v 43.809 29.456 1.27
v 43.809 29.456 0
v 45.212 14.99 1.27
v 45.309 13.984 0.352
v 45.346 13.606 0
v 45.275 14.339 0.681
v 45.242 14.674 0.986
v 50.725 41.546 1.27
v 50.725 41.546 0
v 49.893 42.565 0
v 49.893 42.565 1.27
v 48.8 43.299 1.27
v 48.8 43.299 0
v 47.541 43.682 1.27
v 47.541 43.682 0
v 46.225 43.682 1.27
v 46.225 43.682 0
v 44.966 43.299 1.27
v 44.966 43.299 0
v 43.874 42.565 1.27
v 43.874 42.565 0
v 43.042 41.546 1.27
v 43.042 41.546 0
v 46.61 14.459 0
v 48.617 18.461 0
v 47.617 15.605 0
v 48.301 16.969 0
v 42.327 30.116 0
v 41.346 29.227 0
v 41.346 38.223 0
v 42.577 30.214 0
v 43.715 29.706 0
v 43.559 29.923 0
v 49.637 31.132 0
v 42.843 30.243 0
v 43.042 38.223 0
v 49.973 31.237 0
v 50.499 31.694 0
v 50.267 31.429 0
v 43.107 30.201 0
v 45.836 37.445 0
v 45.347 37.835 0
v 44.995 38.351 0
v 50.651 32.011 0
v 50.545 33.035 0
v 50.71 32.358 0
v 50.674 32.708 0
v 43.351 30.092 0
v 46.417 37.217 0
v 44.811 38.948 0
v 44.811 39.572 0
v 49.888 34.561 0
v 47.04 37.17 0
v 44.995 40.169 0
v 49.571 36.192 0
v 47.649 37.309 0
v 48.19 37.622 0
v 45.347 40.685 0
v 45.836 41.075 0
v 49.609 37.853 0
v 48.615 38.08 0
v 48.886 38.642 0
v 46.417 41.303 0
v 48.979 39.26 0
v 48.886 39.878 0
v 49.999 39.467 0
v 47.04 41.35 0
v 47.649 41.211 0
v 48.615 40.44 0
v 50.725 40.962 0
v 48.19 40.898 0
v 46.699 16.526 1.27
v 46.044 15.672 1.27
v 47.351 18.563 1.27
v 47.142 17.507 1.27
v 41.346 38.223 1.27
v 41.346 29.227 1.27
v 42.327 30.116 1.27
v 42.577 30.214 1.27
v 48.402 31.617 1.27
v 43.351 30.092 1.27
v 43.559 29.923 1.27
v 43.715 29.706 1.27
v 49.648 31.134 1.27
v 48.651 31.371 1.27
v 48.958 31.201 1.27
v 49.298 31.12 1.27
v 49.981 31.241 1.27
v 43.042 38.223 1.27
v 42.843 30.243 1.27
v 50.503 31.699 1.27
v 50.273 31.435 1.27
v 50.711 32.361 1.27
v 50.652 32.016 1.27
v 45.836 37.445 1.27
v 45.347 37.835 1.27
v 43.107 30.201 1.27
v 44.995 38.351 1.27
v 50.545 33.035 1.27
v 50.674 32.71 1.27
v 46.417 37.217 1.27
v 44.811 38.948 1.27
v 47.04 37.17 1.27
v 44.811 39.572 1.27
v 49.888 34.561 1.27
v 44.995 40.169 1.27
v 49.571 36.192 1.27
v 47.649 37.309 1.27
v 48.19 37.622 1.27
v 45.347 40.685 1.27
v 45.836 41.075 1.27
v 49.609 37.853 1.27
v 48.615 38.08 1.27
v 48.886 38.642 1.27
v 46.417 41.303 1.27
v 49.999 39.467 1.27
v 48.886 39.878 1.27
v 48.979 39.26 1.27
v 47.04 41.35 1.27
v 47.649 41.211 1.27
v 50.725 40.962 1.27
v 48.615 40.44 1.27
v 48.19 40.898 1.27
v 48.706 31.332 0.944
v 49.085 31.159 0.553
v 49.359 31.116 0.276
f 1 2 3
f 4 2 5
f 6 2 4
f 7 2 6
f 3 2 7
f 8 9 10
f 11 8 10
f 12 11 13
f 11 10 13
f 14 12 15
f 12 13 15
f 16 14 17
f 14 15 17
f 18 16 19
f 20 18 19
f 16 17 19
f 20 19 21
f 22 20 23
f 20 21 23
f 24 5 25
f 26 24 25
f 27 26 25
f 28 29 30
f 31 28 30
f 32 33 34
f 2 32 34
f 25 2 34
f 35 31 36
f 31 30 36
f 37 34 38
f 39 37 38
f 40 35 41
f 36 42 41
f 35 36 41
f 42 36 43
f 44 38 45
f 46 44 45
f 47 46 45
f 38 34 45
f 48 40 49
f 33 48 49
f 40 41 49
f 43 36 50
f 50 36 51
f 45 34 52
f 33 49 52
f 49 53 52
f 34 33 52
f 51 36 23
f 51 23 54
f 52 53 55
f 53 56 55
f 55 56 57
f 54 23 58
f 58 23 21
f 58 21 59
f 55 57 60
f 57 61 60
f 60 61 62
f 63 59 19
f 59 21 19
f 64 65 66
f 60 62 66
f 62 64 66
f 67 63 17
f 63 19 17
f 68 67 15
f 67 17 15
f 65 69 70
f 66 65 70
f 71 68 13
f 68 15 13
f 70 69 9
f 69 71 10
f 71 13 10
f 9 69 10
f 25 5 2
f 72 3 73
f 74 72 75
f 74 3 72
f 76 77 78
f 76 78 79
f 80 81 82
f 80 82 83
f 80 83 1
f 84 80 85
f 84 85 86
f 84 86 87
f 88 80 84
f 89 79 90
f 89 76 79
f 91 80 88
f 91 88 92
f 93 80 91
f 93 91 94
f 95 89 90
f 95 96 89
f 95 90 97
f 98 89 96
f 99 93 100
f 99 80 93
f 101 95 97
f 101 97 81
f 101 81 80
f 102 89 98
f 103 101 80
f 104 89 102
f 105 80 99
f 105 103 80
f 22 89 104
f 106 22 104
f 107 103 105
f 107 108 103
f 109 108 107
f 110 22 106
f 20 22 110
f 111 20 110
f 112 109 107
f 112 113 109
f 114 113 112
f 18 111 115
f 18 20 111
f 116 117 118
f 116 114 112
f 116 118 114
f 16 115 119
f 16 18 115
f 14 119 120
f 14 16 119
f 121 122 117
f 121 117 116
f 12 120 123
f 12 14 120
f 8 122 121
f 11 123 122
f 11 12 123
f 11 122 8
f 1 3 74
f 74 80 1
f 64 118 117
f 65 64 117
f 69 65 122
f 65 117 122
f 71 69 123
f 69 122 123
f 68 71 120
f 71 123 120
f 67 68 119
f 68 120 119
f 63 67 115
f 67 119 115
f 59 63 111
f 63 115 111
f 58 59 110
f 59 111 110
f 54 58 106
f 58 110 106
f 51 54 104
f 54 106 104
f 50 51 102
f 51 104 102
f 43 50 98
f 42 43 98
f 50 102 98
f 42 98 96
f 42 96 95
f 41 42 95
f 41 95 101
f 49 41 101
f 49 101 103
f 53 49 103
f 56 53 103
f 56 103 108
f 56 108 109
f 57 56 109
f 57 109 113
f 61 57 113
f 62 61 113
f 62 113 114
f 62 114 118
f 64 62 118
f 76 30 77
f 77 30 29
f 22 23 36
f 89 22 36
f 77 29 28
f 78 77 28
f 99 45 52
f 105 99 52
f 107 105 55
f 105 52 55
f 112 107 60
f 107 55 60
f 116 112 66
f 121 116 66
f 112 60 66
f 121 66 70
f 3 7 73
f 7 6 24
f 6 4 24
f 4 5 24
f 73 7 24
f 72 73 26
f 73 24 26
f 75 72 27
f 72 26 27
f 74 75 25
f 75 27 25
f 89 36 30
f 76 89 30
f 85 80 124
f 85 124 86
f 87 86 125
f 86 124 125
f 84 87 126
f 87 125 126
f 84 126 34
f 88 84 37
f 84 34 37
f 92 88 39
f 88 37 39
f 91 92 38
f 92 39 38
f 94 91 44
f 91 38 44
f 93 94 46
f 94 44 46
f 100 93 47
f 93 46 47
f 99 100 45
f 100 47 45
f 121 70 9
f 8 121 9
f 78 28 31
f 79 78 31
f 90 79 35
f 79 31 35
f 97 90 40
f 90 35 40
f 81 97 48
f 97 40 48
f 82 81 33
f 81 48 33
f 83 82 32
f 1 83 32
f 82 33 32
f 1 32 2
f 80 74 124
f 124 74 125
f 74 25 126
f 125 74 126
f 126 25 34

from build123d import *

# Parameters (mm, degrees)
BOSS_EXTRUDE1_DEPTH = 1.27
SKETCH2_R           = 2.0955
CUT_EXTRUDE1_DEPTH  = 67.984946971
CHAMFER1_SIZE       = 1.27


with BuildPart() as part:
    # Sketch1 → Boss-Extrude1 (new body)
    with BuildSketch(Plane.XY):
        with BuildLine():
            Line((41.346078307, 38.223115267), (41.346078307, 29.226984353))
            Line((41.346078307, 29.226984353), (42.327409422, 30.115984353))
            ThreePointArc((42.327409422, 30.115984353), (43.232863688, 30.154994662), (43.809226811, 29.455584353))
            Line((43.809226811, 29.455584353), (45.345946242, 13.605984353))
            ThreePointArc((45.345946242, 13.605984353), (47.617277769, 15.604942198), (48.616615569, 18.460831434))
            Line((48.616615569, 18.460831434), (49.637067337, 31.131984353))
            ThreePointArc((49.637067337, 31.131984353), (50.585693925, 31.847551598), (50.544785665, 33.035093345))
            ThreePointArc((50.544785665, 33.035093345), (49.545142222, 37.023211652), (50.724981076, 40.961784353))
            Line((50.724981076, 40.961784353), (50.724981076, 41.545984353))
            ThreePointArc((50.724981076, 41.545984353), (46.883278307, 43.730384353), (43.041575539, 41.545984353))
            Line((43.041575539, 41.545984353), (43.041575539, 38.223115267))
            Line((43.041575539, 38.223115267), (41.346078307, 38.223115267))
        make_face()
    extrude(amount=BOSS_EXTRUDE1_DEPTH)

    # Sketch2 → Cut-Extrude1 (cut, through all)
    with BuildSketch(Plane.XY.offset(1.27)):
        with Locations((46.883278307, 39.259984353)):
            Circle(SKETCH2_R)
    extrude(amount=-CUT_EXTRUDE1_DEPTH, mode=Mode.SUBTRACT)

    # Chamfer1
    chamfer1_edges = [part.edges().sort_by_distance(p)[0] for p in [
        (47.617277769, 15.604942198, 1.27),
        (49.126841453, 24.796407893, 1.27),
    ]]
    chamfer(chamfer1_edges, length=CHAMFER1_SIZE - 0.0001)  # a hair under: the kernel refuses the full size


solid = part.part
